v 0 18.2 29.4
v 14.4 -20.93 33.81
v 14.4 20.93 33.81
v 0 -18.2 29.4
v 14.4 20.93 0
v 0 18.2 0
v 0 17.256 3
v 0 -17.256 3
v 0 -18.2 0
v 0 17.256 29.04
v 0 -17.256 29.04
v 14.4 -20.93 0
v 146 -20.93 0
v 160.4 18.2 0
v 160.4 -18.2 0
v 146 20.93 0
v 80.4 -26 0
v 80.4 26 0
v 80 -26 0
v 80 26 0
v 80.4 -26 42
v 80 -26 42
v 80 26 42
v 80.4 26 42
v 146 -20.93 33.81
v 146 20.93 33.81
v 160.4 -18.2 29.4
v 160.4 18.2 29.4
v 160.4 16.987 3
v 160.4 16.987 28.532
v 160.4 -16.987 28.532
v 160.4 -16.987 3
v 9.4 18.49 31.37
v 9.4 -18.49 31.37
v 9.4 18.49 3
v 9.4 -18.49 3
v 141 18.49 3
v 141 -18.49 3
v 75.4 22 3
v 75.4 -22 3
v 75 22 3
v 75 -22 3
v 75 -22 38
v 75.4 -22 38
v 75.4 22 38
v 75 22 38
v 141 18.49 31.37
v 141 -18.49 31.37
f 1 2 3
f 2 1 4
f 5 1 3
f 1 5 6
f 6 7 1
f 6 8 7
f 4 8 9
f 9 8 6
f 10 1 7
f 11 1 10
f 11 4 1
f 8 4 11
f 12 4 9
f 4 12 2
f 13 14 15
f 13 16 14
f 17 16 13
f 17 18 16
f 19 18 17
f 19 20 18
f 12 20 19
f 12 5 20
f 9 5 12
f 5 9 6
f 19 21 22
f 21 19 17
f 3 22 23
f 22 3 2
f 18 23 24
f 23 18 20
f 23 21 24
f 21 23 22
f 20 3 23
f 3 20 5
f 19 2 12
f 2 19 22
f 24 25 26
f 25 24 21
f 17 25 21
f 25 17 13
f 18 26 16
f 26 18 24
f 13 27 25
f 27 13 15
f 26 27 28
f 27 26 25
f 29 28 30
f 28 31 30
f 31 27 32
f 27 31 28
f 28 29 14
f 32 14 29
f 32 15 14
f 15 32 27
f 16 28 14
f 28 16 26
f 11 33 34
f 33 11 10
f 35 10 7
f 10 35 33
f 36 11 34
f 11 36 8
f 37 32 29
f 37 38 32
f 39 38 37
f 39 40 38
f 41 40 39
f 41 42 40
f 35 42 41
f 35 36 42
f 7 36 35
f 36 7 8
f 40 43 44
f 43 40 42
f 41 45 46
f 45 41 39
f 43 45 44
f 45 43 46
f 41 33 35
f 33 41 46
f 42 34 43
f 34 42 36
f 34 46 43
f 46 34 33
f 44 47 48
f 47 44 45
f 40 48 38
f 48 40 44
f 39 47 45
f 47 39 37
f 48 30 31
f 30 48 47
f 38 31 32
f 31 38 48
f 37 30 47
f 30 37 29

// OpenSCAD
$fn = 32;

// ----------------------------------------------------------------------
// Faired channel: 160 x 52 x 42 mm, 4 mm walls, faired ends
// ----------------------------------------------------------------------

// --- parameters (mm) ---
length = 160;             // channel length
width = 52;               // channel width at mid length
height = 42;              // channel height at mid length
wall = 4;                 // side wall thickness
floor_t = 3;              // floor thickness
end_w = 36.4;             // faired end width
end_h = 29.4;             // faired end height

difference() {
  union() {
    hull() {
      translate([0, -18.2, 0]) cube([0.4, 36.4, 29.4]);
      translate([14.4, -20.93, 0]) cube([0.4, 41.86, 33.81]);
    }
    hull() {
      translate([14.4, -20.93, 0]) cube([0.4, 41.86, 33.81]);
      translate([80, -26, 0]) cube([0.4, 52, 42]);
    }
    hull() {
      translate([80, -26, 0]) cube([0.4, 52, 42]);
      translate([145.6, -20.93, 0]) cube([0.4, 41.86, 33.81]);
    }
    hull() {
      translate([145.6, -20.93, 0]) cube([0.4, 41.86, 33.81]);
      translate([160, -18.2, 0]) cube([0.4, 36.4, 29.4]);
    }
  }
  /* cavity, 5 mm proud of both ends so the ports are cut clean */
  hull() {
    translate([-5, -16.6, 3]) cube([0.4, 33.2, 24.8]);
    translate([9.4, -18.49, 3]) cube([0.4, 36.98, 28.37]);
  }
  hull() {
    translate([9.4, -18.49, 3]) cube([0.4, 36.98, 28.37]);
    translate([75, -22, 3]) cube([0.4, 44, 35]);
  }
  hull() {
    translate([75, -22, 3]) cube([0.4, 44, 35]);
    translate([140.6, -18.49, 3]) cube([0.4, 36.98, 28.37]);
  }
  hull() {
    translate([140.6, -18.49, 3]) cube([0.4, 36.98, 28.37]);
    translate([165, -16.6, 3]) cube([0.4, 33.2, 24.8]);
  }
}
